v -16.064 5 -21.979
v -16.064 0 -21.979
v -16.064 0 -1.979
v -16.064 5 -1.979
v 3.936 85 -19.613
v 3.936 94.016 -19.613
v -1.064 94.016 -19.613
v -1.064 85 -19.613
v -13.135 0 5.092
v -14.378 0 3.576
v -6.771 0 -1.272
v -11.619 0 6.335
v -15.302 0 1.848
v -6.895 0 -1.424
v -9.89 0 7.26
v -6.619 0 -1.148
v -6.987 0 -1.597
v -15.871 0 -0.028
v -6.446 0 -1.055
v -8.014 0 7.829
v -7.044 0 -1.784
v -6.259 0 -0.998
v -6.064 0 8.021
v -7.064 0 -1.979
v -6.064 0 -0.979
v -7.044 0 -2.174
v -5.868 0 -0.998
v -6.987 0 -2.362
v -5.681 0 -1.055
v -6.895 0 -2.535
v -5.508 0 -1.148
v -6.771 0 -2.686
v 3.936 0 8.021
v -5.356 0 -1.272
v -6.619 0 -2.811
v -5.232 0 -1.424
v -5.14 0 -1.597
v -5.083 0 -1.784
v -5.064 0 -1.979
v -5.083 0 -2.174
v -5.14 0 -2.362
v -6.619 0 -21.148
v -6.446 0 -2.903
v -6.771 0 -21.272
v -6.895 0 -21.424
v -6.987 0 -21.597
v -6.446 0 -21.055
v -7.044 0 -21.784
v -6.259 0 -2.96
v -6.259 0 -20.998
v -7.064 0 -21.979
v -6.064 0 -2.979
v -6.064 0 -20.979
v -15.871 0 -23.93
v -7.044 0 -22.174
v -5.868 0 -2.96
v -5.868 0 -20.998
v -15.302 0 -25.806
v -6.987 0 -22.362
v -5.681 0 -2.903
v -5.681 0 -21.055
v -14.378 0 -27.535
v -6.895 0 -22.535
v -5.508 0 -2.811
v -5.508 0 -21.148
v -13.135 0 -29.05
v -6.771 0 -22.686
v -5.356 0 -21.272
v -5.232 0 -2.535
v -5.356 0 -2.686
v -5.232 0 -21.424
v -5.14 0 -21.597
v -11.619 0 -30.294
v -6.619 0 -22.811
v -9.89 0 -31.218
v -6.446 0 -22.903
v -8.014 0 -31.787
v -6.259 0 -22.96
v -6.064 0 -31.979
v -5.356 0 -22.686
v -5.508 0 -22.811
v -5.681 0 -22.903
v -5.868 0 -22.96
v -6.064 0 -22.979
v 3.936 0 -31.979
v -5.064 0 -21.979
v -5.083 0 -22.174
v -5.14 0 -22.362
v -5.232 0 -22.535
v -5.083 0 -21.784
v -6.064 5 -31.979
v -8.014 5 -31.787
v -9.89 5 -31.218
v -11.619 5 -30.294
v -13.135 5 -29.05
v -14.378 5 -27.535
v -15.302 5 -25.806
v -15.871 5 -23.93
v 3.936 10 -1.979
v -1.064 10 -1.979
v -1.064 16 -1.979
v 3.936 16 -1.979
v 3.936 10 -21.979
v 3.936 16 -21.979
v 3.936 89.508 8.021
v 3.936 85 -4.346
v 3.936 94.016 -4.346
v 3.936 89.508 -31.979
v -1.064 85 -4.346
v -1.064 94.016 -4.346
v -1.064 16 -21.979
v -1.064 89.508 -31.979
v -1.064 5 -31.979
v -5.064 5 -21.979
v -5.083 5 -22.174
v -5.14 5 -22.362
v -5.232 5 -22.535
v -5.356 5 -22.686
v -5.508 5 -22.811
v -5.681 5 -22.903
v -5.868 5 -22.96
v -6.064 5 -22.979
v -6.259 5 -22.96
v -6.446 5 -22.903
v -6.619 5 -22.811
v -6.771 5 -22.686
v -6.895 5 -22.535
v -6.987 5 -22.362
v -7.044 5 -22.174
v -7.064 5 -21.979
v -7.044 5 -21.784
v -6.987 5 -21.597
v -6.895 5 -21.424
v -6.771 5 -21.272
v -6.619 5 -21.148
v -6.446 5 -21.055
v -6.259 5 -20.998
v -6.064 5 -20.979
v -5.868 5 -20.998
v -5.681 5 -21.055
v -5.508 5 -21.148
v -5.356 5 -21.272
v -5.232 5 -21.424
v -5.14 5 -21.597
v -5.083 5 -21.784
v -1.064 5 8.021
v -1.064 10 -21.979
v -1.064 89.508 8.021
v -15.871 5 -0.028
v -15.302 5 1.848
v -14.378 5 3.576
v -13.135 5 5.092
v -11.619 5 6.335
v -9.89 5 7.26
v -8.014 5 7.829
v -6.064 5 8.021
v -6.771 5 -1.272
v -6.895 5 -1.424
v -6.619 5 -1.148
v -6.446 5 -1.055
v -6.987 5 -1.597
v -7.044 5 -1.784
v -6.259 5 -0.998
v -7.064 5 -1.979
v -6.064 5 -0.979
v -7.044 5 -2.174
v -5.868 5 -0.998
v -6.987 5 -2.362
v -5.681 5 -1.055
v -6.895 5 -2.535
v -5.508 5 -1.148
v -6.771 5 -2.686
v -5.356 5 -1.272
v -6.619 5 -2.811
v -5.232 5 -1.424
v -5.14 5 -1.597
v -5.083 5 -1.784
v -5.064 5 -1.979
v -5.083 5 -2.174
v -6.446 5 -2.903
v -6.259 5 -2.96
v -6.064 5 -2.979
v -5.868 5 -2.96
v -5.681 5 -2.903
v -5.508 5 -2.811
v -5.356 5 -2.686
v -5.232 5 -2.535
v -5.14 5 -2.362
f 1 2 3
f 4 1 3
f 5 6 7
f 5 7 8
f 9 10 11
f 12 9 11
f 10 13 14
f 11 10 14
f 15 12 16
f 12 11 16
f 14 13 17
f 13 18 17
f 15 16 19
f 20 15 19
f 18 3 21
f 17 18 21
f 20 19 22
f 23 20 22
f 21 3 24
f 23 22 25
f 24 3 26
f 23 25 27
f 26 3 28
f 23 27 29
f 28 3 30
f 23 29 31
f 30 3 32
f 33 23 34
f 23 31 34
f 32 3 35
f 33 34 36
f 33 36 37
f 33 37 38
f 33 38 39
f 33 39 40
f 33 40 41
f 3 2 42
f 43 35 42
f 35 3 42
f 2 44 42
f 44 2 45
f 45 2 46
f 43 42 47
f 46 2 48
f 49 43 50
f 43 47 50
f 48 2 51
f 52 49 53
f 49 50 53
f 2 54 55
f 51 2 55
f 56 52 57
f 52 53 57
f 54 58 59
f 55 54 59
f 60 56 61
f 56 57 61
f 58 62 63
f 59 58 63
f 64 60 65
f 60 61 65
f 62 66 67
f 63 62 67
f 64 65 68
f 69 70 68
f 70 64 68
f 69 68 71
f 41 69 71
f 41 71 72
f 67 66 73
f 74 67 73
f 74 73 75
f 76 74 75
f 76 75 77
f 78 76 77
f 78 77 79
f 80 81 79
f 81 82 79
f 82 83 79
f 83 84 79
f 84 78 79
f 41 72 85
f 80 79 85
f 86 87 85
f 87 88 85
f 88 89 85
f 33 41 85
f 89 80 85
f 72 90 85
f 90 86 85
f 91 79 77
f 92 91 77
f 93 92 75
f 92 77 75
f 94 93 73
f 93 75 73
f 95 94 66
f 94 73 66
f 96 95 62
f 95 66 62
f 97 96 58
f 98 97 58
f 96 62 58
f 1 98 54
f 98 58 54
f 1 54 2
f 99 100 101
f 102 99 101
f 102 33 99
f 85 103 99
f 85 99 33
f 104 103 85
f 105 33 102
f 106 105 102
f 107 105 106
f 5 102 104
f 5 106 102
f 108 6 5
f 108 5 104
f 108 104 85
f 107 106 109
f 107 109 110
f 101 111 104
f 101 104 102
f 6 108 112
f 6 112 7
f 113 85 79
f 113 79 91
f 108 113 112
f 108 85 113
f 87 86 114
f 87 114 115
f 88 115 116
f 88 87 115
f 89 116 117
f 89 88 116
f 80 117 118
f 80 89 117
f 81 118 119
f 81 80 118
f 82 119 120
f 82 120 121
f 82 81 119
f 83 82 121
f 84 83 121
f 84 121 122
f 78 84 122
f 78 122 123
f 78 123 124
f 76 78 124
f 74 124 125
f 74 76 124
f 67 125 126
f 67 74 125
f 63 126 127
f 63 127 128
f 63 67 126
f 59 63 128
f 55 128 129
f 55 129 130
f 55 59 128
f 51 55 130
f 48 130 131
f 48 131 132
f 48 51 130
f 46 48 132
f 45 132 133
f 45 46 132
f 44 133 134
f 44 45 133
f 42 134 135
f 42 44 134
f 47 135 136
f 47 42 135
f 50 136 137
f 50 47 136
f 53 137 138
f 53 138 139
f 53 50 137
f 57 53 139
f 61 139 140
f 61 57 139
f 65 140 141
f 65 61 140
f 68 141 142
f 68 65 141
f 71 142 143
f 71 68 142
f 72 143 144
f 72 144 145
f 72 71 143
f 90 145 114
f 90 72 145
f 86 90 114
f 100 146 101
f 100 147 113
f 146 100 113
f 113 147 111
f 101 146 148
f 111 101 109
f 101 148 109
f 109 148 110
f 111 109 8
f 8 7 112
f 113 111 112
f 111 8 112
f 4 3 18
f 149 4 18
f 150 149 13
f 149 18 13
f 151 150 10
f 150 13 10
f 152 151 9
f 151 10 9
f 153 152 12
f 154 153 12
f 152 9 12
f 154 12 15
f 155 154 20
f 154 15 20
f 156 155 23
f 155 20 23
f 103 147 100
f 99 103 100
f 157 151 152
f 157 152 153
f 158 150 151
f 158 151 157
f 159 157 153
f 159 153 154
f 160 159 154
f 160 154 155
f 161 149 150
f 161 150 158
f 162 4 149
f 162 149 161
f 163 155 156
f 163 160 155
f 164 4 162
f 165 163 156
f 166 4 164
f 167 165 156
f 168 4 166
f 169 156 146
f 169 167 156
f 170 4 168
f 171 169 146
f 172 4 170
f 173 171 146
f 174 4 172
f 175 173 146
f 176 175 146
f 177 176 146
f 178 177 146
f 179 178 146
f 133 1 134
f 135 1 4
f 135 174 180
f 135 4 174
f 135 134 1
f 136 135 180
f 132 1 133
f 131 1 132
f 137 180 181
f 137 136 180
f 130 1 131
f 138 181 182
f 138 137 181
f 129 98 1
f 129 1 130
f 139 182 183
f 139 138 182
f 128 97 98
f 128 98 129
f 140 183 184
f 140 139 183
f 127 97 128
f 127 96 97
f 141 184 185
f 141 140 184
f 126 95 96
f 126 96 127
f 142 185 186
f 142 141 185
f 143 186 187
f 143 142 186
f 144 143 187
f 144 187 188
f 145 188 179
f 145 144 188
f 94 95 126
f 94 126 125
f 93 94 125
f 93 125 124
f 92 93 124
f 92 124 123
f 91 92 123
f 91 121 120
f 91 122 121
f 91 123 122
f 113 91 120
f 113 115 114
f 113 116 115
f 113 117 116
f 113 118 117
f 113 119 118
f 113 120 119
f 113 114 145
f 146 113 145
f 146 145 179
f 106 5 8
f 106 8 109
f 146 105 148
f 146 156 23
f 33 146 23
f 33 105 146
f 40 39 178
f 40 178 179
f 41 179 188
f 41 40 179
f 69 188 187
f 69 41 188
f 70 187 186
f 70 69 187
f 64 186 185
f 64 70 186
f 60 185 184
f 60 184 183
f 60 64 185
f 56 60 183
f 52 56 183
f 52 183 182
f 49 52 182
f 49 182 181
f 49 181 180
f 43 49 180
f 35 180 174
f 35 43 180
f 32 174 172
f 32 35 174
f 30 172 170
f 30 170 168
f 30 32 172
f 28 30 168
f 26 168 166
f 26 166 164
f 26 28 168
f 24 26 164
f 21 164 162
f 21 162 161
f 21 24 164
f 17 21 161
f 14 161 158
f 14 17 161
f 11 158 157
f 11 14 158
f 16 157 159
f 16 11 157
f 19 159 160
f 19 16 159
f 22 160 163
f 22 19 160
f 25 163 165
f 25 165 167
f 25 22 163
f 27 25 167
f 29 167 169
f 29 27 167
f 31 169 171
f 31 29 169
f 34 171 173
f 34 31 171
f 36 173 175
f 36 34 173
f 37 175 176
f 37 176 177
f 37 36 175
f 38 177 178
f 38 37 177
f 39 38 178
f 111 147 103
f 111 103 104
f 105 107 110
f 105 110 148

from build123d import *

# Parameters (mm, degrees)
SKETCH1_R           = 1
BOSS_EXTRUDE1_DEPTH = 5
BOSS_EXTRUDE2_DEPTH = 5
SKETCH6_W           = 20
SKETCH6_H           = 6
CUT_EXTRUDE1_DEPTH  = 5


with BuildPart() as part:
    # Sketch1 → Boss-Extrude1 (new body)
    with BuildSketch(Plane(origin=(0, 0, 0), x_dir=(1, 0, 0), z_dir=(0, 1, 0))):
        with BuildLine():
            Line((-6.063583, -8.020726268), (3.936417, -8.020726268))
            Line((3.936417, -8.020726268), (3.936417, 31.979273732))
            Line((3.936417, 31.979273732), (-6.063583, 31.979273732))
            ThreePointArc((-6.063583, 31.979273732), (-13.134650812, 29.050341544), (-16.063583, 21.979273732))
            Line((-16.063583, 21.979273732), (-16.063583, 1.979273732))
            ThreePointArc((-16.063583, 1.979273732), (-13.134650812, -5.09179408), (-6.063583, -8.020726268))
        make_face()
        with Locations((-6.063583, 21.979273732)):
            Circle(SKETCH1_R, mode=Mode.SUBTRACT)
        with Locations((-6.063583, 1.979273732)):
            Circle(SKETCH1_R, mode=Mode.SUBTRACT)
    extrude(amount=BOSS_EXTRUDE1_DEPTH)

    # Sketch5 → Boss-Extrude2 (add)
    with BuildSketch(Plane(origin=(3.936417, 0, 0), x_dir=(0, 0, -1), z_dir=(1, 0, 0))):
        Polygon((-8.020726268, 5), (31.979273732, 5), (31.979273732, 89.50779106), (19.612713583, 94.015582119), (19.612713583, 85), (4.345833881, 85), (4.345833881, 94.015582119), (-8.020726268, 89.50779106), align=None)
    extrude(amount=-BOSS_EXTRUDE2_DEPTH)

    # Sketch6 → Cut-Extrude1 (cut)
    with BuildSketch(Plane.ZY.offset(1.063583)):
        with Locations((-11.979273732, 13)):
            Rectangle(SKETCH6_W, SKETCH6_H)
    extrude(amount=-CUT_EXTRUDE1_DEPTH, mode=Mode.SUBTRACT)


solid = part.part
